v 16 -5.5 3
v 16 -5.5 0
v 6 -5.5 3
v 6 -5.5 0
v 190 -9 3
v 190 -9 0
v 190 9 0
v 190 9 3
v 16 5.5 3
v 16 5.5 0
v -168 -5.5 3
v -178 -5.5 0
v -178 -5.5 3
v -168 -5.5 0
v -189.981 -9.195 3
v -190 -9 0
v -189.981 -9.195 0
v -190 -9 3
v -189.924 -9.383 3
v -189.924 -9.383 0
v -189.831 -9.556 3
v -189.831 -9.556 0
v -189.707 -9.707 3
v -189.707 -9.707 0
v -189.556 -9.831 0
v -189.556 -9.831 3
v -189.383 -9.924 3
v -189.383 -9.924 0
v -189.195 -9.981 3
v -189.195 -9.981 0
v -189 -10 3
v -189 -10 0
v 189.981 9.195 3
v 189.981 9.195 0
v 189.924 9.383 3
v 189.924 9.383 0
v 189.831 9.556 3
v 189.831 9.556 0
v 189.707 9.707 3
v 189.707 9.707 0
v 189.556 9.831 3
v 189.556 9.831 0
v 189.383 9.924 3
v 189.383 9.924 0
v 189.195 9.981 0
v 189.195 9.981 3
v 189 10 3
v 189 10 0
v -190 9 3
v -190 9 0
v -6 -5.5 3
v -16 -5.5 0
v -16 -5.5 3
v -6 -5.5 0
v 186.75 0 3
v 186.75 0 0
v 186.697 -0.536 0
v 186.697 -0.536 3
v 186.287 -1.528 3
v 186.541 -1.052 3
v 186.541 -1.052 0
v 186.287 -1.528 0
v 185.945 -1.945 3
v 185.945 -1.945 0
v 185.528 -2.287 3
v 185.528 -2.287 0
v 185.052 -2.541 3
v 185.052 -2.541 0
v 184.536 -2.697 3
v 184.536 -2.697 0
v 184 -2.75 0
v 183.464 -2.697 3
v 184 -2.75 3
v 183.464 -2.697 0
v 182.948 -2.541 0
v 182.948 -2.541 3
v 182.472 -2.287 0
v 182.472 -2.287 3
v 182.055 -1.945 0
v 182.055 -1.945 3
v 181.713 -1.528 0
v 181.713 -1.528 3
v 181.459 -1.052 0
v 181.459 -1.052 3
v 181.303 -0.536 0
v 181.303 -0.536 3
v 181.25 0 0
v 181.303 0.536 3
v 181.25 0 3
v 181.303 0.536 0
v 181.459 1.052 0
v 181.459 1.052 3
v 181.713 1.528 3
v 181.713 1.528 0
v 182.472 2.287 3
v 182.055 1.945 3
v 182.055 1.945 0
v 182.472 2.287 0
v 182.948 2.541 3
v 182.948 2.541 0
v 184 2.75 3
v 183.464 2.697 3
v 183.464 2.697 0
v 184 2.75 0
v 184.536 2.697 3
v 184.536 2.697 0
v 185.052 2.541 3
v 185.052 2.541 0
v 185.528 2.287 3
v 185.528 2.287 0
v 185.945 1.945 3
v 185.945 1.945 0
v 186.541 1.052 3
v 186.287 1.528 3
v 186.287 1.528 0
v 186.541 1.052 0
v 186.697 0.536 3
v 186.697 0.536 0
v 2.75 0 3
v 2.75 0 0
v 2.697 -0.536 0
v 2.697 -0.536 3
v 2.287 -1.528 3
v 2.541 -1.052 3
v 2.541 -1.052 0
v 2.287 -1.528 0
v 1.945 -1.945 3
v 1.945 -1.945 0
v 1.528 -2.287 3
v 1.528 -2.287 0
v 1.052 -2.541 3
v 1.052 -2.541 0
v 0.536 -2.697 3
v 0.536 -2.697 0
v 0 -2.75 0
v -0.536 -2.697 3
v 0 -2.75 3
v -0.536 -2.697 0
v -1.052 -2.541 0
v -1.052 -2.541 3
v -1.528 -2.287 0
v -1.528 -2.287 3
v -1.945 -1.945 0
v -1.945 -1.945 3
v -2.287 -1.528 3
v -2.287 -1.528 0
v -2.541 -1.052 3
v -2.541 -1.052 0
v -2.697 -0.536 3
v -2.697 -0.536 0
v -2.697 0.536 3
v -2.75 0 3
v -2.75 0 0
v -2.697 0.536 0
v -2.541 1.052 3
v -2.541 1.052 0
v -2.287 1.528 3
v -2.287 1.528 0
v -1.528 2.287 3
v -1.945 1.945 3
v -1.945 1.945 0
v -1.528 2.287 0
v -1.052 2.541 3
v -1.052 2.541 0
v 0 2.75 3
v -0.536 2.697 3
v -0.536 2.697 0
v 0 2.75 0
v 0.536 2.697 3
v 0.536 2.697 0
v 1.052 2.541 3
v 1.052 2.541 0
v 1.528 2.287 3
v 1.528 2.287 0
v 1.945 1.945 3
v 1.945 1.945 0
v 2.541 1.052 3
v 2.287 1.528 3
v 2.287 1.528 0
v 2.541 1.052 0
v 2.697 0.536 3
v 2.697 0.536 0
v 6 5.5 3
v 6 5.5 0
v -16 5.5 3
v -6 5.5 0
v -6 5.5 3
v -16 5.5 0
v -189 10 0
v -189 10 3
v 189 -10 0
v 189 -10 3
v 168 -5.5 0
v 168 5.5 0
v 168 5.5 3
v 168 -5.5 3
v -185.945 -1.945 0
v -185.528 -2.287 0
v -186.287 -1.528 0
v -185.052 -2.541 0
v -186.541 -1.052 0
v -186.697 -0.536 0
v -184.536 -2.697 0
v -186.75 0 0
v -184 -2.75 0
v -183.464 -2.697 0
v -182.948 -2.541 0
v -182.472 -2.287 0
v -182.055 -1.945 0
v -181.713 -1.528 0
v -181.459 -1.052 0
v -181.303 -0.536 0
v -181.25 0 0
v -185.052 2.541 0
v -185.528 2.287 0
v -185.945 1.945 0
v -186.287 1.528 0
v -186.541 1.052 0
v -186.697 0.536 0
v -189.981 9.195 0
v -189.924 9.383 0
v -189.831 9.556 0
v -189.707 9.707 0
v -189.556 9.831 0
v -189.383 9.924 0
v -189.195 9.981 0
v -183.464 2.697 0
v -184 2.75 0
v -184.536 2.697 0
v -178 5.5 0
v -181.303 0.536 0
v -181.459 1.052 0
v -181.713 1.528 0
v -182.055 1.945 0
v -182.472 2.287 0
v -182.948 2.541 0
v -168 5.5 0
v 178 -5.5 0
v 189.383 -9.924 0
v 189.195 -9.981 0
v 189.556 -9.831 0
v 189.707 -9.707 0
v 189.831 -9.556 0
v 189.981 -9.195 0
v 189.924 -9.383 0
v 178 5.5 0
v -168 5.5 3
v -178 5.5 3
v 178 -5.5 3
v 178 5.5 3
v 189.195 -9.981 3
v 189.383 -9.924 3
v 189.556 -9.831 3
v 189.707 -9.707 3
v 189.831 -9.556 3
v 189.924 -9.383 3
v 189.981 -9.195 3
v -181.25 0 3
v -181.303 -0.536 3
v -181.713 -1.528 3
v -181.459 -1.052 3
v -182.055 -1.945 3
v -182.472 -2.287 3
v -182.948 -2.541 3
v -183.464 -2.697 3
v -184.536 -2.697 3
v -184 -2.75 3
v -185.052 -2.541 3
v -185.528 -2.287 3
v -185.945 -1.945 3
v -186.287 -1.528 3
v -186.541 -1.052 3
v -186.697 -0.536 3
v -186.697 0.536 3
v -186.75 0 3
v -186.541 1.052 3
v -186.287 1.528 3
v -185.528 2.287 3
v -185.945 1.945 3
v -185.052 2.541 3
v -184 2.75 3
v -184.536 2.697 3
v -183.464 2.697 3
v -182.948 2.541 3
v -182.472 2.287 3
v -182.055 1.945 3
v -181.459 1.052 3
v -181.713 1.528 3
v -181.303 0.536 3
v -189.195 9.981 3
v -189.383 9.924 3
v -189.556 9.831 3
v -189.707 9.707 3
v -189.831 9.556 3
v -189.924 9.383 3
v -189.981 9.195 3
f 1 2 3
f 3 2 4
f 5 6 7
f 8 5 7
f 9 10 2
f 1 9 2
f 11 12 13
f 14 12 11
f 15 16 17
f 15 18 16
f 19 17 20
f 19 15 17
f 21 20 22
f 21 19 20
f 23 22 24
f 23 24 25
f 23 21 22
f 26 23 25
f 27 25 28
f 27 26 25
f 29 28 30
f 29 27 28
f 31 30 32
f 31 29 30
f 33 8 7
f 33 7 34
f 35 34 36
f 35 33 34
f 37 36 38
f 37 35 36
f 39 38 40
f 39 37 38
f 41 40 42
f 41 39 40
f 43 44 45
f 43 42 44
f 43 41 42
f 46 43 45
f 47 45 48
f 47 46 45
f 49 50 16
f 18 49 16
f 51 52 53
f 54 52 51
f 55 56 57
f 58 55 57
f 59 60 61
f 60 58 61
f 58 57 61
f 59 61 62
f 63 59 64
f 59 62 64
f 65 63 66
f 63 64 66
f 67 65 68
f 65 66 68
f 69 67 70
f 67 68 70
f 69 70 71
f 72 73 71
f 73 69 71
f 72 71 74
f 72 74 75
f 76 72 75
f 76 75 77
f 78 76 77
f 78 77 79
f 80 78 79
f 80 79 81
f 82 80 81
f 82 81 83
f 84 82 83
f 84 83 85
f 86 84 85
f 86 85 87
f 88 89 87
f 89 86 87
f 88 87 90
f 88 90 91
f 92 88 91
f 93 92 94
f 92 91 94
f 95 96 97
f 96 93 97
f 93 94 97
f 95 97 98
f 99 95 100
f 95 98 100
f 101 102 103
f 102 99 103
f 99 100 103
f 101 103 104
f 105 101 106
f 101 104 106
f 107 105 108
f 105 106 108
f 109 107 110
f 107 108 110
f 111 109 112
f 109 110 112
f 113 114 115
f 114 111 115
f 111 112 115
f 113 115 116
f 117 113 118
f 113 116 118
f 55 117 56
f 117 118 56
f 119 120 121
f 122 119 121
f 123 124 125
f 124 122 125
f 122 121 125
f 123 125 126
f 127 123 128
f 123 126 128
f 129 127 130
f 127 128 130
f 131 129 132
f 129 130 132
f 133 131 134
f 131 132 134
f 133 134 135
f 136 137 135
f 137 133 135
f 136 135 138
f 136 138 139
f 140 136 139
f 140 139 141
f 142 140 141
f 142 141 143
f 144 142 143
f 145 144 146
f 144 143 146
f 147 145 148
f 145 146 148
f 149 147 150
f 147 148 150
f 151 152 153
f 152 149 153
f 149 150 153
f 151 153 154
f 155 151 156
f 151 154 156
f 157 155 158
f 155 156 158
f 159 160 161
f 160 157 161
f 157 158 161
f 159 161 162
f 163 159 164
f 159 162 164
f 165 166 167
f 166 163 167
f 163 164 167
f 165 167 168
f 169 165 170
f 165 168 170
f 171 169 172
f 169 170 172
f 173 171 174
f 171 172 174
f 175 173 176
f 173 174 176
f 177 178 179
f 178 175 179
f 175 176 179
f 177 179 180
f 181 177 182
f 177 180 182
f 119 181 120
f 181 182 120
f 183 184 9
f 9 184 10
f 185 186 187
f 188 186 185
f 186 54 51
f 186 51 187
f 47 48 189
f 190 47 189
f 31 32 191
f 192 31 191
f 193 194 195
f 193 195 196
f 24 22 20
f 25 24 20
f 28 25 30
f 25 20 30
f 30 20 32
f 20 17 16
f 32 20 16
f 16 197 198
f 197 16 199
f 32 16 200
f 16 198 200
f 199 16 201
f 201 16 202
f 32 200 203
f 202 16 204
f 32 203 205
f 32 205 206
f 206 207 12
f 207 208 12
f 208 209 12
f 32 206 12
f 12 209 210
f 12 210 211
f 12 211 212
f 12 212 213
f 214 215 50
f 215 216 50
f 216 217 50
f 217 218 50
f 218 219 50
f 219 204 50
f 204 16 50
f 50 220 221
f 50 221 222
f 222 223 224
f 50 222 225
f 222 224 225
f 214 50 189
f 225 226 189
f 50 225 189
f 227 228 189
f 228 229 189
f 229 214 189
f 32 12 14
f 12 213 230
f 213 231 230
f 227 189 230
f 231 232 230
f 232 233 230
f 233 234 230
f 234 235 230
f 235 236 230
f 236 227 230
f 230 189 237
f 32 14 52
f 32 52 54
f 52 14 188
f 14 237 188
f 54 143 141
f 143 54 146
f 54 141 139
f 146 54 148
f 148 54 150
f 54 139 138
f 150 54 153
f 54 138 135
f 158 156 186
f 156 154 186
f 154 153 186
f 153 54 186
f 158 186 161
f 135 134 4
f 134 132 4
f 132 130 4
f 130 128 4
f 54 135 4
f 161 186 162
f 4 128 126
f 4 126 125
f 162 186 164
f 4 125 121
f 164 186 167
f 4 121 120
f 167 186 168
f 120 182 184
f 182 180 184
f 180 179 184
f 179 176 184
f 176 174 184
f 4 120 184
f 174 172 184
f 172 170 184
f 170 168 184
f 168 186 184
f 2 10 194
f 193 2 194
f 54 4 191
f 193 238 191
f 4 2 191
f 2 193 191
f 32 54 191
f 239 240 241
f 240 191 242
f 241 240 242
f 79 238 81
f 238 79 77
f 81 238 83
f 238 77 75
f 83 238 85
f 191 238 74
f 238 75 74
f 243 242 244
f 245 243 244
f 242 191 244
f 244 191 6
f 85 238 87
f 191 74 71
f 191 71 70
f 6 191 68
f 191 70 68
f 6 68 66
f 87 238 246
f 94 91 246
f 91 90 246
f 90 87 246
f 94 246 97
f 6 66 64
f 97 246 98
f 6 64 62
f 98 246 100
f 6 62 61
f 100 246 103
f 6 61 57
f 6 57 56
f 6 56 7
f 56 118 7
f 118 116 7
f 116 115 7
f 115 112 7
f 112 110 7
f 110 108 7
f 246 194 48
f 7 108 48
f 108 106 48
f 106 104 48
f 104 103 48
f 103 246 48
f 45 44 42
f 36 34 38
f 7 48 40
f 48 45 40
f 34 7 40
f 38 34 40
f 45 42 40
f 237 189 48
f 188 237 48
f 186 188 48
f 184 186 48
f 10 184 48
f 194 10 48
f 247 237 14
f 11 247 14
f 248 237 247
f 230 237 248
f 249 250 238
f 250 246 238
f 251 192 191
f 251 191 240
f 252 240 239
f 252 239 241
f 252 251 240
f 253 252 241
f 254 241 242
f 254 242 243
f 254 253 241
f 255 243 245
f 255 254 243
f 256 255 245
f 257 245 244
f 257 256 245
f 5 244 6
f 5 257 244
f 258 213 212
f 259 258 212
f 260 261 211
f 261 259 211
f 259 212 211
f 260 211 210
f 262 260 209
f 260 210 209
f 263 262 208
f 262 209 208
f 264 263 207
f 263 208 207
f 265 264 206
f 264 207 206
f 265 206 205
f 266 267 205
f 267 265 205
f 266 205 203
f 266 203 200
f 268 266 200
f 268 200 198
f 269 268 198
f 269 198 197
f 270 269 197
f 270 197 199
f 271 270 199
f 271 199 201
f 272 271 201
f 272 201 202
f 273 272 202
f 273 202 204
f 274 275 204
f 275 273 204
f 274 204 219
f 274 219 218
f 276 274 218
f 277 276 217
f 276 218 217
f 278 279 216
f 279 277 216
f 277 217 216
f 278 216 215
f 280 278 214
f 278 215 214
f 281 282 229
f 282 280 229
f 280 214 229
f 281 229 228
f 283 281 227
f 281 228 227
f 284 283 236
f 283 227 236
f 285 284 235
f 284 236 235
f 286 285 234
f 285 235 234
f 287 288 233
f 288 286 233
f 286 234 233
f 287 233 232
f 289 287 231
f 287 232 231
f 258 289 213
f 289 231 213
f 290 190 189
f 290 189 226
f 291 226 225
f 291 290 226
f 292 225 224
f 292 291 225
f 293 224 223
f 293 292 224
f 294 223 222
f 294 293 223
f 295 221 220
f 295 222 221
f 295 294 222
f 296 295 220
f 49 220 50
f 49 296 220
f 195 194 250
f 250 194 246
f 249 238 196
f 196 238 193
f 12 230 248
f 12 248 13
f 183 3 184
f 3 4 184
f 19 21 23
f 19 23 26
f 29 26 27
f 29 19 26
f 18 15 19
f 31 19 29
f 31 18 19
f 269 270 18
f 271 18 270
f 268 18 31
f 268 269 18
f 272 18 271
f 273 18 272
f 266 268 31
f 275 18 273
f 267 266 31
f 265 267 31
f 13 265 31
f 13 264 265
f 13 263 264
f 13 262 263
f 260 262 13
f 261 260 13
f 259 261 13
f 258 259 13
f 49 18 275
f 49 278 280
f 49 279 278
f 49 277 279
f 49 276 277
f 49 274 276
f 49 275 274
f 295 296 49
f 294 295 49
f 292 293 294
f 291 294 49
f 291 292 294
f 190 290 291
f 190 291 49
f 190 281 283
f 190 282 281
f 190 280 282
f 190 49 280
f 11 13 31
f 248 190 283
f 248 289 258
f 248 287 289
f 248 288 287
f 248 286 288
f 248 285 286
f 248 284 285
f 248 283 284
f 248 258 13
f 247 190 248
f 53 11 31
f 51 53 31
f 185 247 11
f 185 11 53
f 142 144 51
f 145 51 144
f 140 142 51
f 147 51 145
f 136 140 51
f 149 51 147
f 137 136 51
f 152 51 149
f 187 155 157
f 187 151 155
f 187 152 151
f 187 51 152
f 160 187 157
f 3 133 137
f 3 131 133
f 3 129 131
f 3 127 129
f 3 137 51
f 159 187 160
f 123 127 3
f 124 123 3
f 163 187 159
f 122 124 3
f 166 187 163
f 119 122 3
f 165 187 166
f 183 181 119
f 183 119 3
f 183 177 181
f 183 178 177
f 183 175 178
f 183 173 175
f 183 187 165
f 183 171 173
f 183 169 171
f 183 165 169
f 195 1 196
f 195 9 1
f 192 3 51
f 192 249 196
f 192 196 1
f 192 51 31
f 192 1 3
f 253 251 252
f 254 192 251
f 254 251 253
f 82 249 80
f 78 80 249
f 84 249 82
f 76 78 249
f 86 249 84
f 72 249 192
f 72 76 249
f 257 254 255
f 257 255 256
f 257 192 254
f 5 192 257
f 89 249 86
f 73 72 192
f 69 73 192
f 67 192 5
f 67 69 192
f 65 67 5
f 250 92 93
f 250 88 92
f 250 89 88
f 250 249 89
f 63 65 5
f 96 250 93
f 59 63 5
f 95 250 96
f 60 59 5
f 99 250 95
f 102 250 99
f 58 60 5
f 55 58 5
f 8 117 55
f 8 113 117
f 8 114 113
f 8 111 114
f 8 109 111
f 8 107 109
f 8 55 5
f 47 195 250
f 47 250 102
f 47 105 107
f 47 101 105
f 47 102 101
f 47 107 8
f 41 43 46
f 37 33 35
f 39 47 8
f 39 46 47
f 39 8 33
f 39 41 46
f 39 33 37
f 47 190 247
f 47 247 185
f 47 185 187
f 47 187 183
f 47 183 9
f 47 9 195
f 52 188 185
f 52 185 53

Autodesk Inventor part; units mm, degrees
ref_plane "YZ Plane" through (0, 0, 0) normal (1, 0, 0) x (0, 1, 0)
ref_plane "XZ Plane" through (0, 0, 0) normal (0, 1, 0) x (-1, 0, 0)
ref_plane "XY Plane" through (0, 0, 0) normal (0, 0, 1) x (1, 0, 0)
sketch "Sketch1" plane through (0, 0, 0) normal (0, 0, 1) x (1, 0, 0)
  line L0 (-190, -10) -> (190, -10)
  line L1 (190, -10) -> (190, 10)
  line L2 (190, 10) -> (-190, 10)
  line L3 (-190, 10) -> (-190, -10)
  line L4 (-190, -10) -> (190, 10) construction
  line L5 (190, -10) -> (-190, 10) construction
  line L6 (-266.2899, 0) -> (266.2899, 0) construction
  line L7 (-178, -5.5) -> (-6, -5.5)
  line L8 (-6, -5.5) -> (-6, 5.5)
  line L9 (-6, 5.5) -> (-178, 5.5)
  line L10 (-178, 5.5) -> (-178, -5.5)
  line L11 (-178, -5.5) -> (-6, 5.5) construction
  line L12 (-6, -5.5) -> (-178, 5.5) construction
  line L13 (0, 14.2899) -> (0, -14.2899) construction
  line L14 (178, -5.5) -> (6, -5.5)
  line L15 (6, -5.5) -> (6, 5.5)
  line L16 (6, 5.5) -> (178, 5.5)
  line L17 (178, 5.5) -> (178, -5.5)
  line L18 (178, -5.5) -> (6, 5.5) construction
  line L19 (6, -5.5) -> (178, 5.5) construction
  circle A0 centre (-184, 0) radius 2.75
  circle A1 centre (0, 0) radius 2.75
  circle A2 centre (184, 0) radius 2.75
  line L20 (-178, 5.5) -> (-168, 5.5)
  line L21 (-168, 5.5) -> (-168, -5.5)
  line L22 (-168, -5.5) -> (-178, -5.5)
  line L23 (-178, -5.5) -> (-178, 5.5)
  line L24 (-6, 5.5) -> (-16, 5.5)
  line L25 (-16, 5.5) -> (-16, -5.5)
  line L26 (-16, -5.5) -> (-6, -5.5)
  line L27 (-6, -5.5) -> (-6, 5.5)
  line L28 (16, 5.5) -> (16, -5.5)
  line L29 (168, 5.5) -> (168, -5.5)
  point P0 (-92, 0)
  point P1 (92, 0)
  point P2 (168, -5.5)
  dimension "d0" = 380
  dimension "d1" = 20
  dimension "d2" = 11
  dimension "d3" = 12
  dimension "d4" = 6
  dimension "d5" = 5.5
  dimension "d6" = 6
  dimension "d7" = 5.5
  dimension "d11" = 10
  dimension "d12" = 10
extrude "Extrusion1" add sketch "Sketch1" along normal blind 3 contours L3 L2 L1 L0 | L21 L9 L25 L7 | L14 L28 L16 L29
fillet "Fillet1" radius 1 4 edges at (-190, -10, 1.5) (-190, 10, 1.5) (190, -10, 1.5) (190, 10, 1.5)
sketch "Sketch2" plane through (0, 0, 3) normal (0, 0, 1) x (1, 0, 0)
  arc A0 (190, 9) -> (189, 10) centre (189, 9) ccw projected
  line L0 (189, 10) -> (-189, 10) projected
  arc A1 (-189, 10) -> (-190, 9) centre (-189, 9) ccw projected
  line L1 (-190, 9) -> (-190, -9) projected
  arc A2 (-190, -9) -> (-189, -10) centre (-189, -9) ccw projected
  line L2 (-189, -10) -> (189, -10) projected
  arc A3 (189, -10) -> (190, -9) centre (189, -9) ccw projected
  line L3 (190, -9) -> (190, 9) projected
  circle A4 centre (-184, 0) radius 2.75 projected
  circle A5 centre (0, 0) radius 2.75 projected
  circle A6 centre (184, 0) radius 2.75 projected
  line L4 (16, 5.5) -> (16, -5.5) projected
  line L5 (16, -5.5) -> (6, -5.5) projected
  line L6 (6, -5.5) -> (6, 5.5) projected
  line L7 (6, 5.5) -> (16, 5.5) projected
  line L8 (-168, 5.5) -> (-168, -5.5) projected
  line L9 (-168, -5.5) -> (-178, -5.5) projected
  line L10 (-178, -5.5) -> (-178, 5.5) projected
  line L11 (-178, 5.5) -> (-168, 5.5) projected
  line L12 (168, 5.5) -> (178, 5.5) projected
  line L13 (178, 5.5) -> (178, -5.5) projected
  line L14 (178, -5.5) -> (168, -5.5) projected
  line L15 (168, -5.5) -> (168, 5.5) projected
  line L16 (-16, 5.5) -> (-6, 5.5) projected
  line L17 (-6, 5.5) -> (-6, -5.5) projected
  line L18 (-6, -5.5) -> (-16, -5.5) projected
  line L19 (-16, -5.5) -> (-16, 5.5) projected
equation "\"d6\" = 0.5 * d3"
equation "\"d7\" = d5"
equation "\"d12\" = d11"
properties part number "LED_Holder_FrontTop"
